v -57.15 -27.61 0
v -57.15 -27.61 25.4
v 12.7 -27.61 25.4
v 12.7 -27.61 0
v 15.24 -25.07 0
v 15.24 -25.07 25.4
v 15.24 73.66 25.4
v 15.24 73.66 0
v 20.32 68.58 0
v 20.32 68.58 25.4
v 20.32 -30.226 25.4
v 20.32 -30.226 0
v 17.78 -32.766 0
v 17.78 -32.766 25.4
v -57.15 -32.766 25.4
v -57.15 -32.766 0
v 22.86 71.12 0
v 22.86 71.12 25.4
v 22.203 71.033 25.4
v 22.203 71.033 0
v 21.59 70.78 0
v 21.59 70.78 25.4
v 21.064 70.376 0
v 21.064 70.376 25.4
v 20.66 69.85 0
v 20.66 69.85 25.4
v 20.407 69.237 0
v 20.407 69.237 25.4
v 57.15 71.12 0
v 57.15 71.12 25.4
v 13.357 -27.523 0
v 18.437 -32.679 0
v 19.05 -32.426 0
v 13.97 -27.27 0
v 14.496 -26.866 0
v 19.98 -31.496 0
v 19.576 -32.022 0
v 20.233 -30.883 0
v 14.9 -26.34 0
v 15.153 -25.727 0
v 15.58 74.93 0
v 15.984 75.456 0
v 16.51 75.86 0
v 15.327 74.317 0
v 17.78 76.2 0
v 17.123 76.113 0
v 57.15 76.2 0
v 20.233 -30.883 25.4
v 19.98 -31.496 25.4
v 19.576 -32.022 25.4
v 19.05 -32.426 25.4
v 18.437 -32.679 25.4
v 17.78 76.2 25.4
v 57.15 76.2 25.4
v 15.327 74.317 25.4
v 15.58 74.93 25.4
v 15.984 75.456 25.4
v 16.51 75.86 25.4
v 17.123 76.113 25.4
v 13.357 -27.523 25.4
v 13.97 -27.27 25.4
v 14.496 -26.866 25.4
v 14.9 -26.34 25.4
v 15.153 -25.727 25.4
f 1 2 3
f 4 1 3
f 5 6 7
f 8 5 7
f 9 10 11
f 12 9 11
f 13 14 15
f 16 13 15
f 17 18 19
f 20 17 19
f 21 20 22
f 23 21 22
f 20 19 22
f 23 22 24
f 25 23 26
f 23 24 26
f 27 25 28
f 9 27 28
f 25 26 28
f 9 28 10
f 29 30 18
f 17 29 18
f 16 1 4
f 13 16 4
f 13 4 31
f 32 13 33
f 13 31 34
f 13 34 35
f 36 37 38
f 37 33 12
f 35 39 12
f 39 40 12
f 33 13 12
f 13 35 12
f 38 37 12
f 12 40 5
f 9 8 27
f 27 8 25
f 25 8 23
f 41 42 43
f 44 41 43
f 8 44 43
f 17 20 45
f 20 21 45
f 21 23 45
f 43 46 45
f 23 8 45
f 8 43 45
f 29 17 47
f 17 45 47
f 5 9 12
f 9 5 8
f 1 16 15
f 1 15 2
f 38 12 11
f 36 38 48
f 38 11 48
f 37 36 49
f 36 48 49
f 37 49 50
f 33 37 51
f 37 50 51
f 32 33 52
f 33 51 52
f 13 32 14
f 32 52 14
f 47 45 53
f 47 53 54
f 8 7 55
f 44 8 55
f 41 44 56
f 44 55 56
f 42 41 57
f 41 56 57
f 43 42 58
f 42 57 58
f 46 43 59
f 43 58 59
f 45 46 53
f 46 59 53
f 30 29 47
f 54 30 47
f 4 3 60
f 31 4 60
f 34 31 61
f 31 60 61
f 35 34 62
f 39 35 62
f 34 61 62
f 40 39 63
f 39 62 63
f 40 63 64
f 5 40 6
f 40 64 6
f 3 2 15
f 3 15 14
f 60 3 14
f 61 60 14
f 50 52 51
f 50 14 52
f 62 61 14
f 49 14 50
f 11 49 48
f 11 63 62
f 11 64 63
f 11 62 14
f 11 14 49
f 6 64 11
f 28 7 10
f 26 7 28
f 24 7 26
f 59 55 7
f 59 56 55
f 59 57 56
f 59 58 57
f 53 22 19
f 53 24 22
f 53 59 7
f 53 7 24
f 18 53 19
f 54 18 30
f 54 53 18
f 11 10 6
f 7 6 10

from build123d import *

# Parameters (mm, degrees)
SKETCH1_W           = 114.3
SKETCH1_H           = 152.4
BOSS_EXTRUDE1_DEPTH = 25.4
CUT_EXTRUDE1_DEPTH  = 99.578509321


with BuildPart() as part:
    # Sketch1 → Boss-Extrude1 (new body)
    with BuildSketch(Plane.XY):
        Rectangle(SKETCH1_W, SKETCH1_H)
    extrude(amount=BOSS_EXTRUDE1_DEPTH)

    # Sketch2 → Cut-Extrude1 (cut, through all)
    with BuildSketch(Plane.XY.offset(25.4)):
        with BuildLine():
            Line((57.15, 71.12), (22.86, 71.12))
            ThreePointArc((22.86, 71.12), (21.063948776, 70.376051224), (20.32, 68.58))
            Line((20.32, 68.58), (20.32, -30.226))
            ThreePointArc((20.32, -30.226), (19.576051224, -32.022051224), (17.78, -32.766))
            Line((17.78, -32.766), (-57.15, -32.766))
            Line((-57.15, -32.766), (-57.15, -76.2))
            Line((-57.15, -76.2), (57.15, -76.2))
            Line((57.15, -76.2), (57.15, 71.12))
        make_face()
        with BuildLine():
            ThreePointArc((15.24, 73.66), (15.983948776, 75.456051224), (17.78, 76.2))
            Line((17.78, 76.2), (-57.15, 76.2))
            Line((-57.15, 76.2), (-57.15, -27.6098))
            Line((-57.15, -27.6098), (12.7, -27.6098))
            ThreePointArc((12.7, -27.6098), (14.496051224, -26.865851224), (15.24, -25.0698))
            Line((15.24, -25.0698), (15.24, 73.66))
        make_face()
    extrude(amount=-CUT_EXTRUDE1_DEPTH, mode=Mode.SUBTRACT)


solid = part.part
